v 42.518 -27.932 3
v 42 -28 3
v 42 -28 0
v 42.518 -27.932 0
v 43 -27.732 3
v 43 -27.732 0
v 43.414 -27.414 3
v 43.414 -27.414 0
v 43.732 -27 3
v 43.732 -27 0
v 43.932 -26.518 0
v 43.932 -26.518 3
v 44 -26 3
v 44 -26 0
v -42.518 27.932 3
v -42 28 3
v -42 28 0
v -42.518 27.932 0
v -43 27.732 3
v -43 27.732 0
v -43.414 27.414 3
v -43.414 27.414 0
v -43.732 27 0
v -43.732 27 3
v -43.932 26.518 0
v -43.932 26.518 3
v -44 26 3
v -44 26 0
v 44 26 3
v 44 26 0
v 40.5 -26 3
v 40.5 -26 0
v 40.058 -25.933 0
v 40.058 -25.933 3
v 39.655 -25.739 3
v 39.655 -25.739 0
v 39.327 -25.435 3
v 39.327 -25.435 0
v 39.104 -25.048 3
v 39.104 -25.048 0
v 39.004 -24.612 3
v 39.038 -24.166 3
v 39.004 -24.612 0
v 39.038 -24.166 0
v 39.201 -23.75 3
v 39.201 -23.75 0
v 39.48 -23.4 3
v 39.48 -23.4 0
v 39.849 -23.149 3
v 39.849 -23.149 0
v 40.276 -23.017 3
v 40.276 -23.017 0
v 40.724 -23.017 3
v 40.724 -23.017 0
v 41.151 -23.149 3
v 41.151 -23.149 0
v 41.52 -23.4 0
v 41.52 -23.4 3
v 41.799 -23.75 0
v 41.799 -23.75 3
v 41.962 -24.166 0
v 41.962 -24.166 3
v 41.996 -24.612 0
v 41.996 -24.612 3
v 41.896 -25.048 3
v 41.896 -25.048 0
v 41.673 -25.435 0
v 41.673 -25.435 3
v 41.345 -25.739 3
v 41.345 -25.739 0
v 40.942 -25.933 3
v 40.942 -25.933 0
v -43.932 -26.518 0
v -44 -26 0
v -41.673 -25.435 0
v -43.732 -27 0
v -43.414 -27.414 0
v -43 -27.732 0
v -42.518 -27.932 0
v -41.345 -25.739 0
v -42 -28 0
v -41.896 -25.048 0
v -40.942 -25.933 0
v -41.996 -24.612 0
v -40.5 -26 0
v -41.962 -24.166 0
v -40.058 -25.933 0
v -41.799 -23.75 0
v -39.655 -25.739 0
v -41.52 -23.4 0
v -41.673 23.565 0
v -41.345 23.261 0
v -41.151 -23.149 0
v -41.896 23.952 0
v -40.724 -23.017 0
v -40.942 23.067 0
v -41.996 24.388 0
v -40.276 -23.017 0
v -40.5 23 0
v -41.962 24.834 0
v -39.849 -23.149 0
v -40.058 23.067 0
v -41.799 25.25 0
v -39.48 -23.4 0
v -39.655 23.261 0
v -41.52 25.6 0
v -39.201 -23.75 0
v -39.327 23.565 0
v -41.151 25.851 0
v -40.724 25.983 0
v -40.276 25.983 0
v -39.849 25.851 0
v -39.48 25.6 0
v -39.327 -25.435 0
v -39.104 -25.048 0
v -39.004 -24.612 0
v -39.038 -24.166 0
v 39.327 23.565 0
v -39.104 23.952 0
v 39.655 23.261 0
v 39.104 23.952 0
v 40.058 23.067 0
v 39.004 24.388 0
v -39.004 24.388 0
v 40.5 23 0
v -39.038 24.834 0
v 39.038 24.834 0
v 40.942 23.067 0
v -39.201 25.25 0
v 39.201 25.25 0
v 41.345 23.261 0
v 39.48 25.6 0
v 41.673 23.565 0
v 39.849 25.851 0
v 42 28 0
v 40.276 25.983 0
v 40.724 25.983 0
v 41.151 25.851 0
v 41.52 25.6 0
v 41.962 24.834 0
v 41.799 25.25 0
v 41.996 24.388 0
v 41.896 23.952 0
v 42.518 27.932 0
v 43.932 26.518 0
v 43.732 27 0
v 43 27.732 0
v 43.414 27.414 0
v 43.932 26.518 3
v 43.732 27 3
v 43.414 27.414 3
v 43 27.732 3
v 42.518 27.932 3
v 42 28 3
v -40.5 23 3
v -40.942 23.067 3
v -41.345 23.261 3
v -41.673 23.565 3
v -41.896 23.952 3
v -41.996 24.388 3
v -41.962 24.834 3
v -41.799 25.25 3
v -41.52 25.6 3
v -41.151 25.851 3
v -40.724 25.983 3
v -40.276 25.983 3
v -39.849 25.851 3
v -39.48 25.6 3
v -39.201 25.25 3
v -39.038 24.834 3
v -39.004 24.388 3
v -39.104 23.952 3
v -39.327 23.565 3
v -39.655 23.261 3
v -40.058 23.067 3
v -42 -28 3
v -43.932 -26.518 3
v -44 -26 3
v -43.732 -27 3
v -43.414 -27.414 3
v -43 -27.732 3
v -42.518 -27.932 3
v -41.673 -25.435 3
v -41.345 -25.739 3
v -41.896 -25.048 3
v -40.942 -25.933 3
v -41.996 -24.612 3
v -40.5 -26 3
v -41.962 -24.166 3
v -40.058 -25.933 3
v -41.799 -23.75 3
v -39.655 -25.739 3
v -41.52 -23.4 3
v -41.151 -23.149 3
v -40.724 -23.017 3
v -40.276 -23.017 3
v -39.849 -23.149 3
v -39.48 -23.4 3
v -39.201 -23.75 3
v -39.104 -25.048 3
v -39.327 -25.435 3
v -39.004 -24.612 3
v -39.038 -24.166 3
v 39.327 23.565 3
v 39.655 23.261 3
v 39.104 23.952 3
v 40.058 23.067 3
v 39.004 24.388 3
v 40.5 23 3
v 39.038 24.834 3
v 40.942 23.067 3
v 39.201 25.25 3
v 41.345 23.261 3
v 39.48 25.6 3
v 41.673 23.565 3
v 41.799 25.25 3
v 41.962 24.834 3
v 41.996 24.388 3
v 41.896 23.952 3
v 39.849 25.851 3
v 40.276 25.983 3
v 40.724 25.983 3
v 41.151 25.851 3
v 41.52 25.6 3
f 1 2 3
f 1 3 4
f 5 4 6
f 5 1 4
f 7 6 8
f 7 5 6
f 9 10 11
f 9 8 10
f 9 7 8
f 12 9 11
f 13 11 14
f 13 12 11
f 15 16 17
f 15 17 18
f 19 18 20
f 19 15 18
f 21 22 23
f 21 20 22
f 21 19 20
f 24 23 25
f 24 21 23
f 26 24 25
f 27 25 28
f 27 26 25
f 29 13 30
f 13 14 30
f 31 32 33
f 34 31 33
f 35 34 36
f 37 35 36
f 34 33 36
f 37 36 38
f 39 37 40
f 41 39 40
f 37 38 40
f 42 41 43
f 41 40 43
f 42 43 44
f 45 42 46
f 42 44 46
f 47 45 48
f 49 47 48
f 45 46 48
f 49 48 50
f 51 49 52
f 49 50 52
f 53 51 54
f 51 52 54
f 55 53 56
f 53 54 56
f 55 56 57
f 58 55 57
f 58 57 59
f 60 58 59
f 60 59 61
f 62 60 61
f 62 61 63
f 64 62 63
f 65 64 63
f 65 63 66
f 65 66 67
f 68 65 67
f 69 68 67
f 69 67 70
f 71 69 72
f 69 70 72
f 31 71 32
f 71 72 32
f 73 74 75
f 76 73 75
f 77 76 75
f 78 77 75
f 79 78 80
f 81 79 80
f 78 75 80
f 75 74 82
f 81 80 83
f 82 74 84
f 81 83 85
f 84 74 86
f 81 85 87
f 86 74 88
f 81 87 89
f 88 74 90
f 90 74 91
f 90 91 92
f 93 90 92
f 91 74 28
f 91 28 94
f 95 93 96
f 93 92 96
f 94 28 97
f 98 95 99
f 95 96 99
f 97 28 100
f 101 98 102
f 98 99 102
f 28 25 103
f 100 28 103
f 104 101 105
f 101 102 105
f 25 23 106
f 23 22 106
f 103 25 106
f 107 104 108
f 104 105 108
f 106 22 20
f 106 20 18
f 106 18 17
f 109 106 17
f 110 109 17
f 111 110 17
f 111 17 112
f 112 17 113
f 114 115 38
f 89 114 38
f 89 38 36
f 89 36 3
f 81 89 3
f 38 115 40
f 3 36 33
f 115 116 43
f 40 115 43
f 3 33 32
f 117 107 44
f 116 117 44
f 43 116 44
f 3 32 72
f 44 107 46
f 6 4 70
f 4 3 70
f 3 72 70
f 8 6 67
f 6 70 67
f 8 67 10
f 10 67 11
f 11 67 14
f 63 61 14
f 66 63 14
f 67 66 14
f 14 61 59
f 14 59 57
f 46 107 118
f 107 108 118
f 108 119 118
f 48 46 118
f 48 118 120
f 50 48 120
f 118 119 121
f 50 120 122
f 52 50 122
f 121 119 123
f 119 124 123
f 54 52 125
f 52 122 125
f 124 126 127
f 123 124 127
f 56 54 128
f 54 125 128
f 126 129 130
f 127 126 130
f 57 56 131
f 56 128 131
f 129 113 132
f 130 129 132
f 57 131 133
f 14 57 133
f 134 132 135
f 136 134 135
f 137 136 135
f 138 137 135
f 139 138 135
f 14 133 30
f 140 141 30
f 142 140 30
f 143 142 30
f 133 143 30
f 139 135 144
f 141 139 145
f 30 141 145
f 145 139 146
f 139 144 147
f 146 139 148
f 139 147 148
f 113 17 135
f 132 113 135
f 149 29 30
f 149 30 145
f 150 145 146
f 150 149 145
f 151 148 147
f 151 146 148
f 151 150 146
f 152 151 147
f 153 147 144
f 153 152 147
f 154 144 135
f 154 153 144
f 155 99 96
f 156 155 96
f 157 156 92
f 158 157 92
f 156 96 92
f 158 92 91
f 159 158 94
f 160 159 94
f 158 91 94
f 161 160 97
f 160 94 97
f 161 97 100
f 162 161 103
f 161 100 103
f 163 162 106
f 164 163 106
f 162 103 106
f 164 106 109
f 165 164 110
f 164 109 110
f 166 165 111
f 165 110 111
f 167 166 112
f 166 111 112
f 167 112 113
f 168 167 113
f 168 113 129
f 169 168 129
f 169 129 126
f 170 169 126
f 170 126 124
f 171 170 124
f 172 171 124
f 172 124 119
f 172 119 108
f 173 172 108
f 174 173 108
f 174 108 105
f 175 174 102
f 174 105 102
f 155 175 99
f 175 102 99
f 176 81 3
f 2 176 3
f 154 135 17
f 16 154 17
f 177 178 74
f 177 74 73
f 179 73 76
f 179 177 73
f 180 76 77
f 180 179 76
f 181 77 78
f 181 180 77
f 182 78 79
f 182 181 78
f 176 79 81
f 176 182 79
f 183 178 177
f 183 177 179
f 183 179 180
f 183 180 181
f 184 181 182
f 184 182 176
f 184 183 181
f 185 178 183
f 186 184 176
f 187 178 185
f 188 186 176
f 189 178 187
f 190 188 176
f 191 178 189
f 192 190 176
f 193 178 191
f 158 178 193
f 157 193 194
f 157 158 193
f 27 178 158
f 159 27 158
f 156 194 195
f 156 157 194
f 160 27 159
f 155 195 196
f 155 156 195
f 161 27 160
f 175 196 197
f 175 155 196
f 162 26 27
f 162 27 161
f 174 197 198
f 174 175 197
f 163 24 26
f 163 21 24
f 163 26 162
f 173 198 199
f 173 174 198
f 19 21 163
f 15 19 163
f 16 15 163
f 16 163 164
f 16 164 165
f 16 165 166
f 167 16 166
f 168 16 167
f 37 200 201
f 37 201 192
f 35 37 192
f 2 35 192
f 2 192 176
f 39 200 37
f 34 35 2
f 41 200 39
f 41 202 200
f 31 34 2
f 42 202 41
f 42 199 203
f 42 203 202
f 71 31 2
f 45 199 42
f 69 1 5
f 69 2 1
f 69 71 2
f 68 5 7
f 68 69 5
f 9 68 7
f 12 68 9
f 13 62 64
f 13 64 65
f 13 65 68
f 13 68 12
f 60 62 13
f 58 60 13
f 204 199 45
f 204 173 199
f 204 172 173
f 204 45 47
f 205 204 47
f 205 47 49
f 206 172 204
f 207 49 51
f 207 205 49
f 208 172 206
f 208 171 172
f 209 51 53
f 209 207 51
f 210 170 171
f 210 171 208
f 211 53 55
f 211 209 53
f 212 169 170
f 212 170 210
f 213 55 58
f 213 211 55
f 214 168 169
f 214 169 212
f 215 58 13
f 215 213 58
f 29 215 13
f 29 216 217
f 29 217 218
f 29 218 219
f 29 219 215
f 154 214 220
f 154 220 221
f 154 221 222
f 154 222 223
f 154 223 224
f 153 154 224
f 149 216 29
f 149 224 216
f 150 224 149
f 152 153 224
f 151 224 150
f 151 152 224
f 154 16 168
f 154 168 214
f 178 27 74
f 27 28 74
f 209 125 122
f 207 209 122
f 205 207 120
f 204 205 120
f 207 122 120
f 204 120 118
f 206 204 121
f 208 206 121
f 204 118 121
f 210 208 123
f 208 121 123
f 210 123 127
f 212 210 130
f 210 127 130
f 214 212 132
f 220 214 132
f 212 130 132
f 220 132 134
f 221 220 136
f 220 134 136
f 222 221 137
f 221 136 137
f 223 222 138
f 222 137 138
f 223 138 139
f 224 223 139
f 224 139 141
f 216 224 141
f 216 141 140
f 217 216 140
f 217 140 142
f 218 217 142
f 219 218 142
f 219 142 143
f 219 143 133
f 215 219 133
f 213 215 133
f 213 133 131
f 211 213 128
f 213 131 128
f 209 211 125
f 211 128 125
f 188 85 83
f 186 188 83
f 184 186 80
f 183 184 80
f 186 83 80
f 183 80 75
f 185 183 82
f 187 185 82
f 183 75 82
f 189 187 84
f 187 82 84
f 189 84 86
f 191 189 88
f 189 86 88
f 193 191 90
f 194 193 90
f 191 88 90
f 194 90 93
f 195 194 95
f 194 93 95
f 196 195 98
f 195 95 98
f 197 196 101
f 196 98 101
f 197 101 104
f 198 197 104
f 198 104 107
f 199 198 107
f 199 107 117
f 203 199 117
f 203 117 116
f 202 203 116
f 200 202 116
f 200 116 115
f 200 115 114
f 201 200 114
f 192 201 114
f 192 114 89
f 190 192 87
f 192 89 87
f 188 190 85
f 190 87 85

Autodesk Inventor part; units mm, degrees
ref_plane "YZ Plane" through (0, 0, 0) normal (1, 0, 0) x (0, 1, 0)
ref_plane "XZ Plane" through (0, 0, 0) normal (0, 1, 0) x (-1, 0, 0)
ref_plane "XY Plane" through (0, 0, 0) normal (0, 0, 1) x (1, 0, 0)
sketch "Sketch1" plane through (0, 0, 0) normal (0, 0, 1) x (1, 0, 0)
  line L0 (-44, -28) -> (44, -28)
  line L1 (44, -28) -> (44, 28)
  line L2 (44, 28) -> (-44, 28)
  line L3 (-44, 28) -> (-44, -28)
  line L4 (-44, -28) -> (44, 28) construction
  line L5 (44, -28) -> (-44, 28) construction
  point P0 (0, 0)
  dimension "d0" = 88
  dimension "d1" = 56
extrude "Extrusion1" add sketch "Sketch1" along normal blind 3
fillet "Fillet1" radius 2 4 edges at (44, 28, 1.5) (44, -28, 1.5) (-44, 28, 1.5) (-44, -28, 1.5)
sketch "Sketch2" plane through (0, 0, 3) normal (0, 0, 1) x (1, 0, 0)
  line L0 (-40.5, -24.5) -> (40.5, -24.5)
  line L1 (40.5, -24.5) -> (40.5, 24.5)
  line L2 (40.5, 24.5) -> (-40.5, 24.5)
  line L3 (-40.5, 24.5) -> (-40.5, -24.5)
  line L4 (-40.5, -24.5) -> (40.5, 24.5) construction
  line L5 (40.5, -24.5) -> (-40.5, 24.5) construction
  point P0 (0, 0)
  point P1 (-40.5, 24.5)
  dimension "d12" = 81
  dimension "d13" = 49
hole "Hole1" at (-40.5, -24.5, 3) at (-40.5, 24.5, 3) at (40.5, -24.5, 3) at (40.5, 24.5, 3) direction (0, 0, -1) diameter 3 end through all
properties part number "Distance_plate"
